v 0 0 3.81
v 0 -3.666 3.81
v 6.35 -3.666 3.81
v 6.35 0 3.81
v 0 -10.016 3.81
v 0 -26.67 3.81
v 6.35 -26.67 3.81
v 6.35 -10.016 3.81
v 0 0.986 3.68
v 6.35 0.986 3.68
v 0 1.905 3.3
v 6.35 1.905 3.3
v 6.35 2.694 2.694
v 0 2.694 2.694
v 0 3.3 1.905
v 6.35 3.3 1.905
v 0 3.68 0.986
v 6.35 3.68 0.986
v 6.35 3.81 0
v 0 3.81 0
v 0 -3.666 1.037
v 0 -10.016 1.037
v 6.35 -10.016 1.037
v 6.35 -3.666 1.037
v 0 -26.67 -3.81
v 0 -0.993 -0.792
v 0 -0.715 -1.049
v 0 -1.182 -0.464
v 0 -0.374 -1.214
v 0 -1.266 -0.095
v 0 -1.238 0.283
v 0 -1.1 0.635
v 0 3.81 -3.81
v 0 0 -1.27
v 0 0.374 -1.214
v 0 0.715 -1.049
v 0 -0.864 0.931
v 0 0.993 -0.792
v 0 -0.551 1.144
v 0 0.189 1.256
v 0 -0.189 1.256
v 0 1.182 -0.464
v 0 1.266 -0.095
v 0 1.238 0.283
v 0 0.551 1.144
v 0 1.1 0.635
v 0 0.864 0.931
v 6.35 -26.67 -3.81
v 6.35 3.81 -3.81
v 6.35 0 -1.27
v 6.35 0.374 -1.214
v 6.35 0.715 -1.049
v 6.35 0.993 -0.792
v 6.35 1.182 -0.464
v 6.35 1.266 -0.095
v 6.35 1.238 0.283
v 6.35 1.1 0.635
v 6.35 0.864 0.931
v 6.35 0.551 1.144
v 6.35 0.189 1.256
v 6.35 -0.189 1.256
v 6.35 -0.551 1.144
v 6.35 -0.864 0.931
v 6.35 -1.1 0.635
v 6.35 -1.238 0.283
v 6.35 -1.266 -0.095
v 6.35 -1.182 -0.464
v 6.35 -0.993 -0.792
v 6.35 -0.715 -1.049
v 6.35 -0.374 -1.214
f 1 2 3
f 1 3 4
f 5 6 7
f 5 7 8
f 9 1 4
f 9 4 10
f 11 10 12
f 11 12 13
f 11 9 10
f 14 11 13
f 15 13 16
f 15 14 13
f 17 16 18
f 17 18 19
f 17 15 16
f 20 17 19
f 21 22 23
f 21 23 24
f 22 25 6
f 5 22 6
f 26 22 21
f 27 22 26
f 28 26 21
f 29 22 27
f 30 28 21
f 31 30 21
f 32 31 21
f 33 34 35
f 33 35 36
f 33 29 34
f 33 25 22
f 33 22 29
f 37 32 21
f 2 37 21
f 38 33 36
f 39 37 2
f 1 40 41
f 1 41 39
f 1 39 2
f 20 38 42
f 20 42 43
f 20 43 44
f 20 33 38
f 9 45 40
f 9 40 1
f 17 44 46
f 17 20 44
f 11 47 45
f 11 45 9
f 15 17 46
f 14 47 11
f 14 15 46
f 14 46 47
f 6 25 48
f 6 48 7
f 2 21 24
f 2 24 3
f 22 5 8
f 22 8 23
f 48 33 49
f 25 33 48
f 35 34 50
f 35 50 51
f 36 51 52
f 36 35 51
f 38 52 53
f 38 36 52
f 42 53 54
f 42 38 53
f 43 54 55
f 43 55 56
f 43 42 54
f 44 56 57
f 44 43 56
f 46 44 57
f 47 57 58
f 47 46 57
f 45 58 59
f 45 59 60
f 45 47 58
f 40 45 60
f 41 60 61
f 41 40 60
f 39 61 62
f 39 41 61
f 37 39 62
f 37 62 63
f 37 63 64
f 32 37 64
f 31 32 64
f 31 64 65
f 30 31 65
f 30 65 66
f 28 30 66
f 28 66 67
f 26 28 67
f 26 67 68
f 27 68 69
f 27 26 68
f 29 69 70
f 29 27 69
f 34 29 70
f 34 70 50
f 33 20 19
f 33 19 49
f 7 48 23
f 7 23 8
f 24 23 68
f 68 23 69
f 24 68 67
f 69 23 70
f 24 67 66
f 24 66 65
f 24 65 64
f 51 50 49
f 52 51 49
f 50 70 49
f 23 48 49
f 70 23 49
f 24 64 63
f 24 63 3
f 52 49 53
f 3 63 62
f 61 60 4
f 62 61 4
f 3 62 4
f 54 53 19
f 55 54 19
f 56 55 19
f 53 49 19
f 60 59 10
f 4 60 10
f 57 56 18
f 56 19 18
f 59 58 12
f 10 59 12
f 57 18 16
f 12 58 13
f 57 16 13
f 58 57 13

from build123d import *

# Parameters (mm, degrees)
ELEVATOR_PADDLE_R   = 1.27
BOSS_EXTRUDE1_DEPTH = 6.35


with BuildPart() as part:
    # Elevator Paddle → Boss-Extrude1 (new body)
    with BuildSketch(Plane(origin=(0, 0, 0), x_dir=(0, 0, -1), z_dir=(1, 0, 0))):
        with BuildLine():
            Line((3.81, 3.81), (3.81, -26.67))
            Line((3.81, -26.67), (-3.81, -26.67))
            Line((-3.81, -26.67), (-3.81, -10.0160188))
            Line((-3.81, -10.0160188), (-1.037499957, -10.0160188))
            Line((-1.037499957, -10.0160188), (-1.037499957, -3.6660188))
            Line((-1.037499957, -3.6660188), (-3.81, -3.6660188))
            Line((-3.81, -3.6660188), (-3.81, 0))
            ThreePointArc((-3.81, 0), (-2.694076836, 2.694076836), (0, 3.81))
            Line((0, 3.81), (3.81, 3.81))
        make_face()
        Circle(ELEVATOR_PADDLE_R, mode=Mode.SUBTRACT)
    extrude(amount=BOSS_EXTRUDE1_DEPTH)


solid = part.part
